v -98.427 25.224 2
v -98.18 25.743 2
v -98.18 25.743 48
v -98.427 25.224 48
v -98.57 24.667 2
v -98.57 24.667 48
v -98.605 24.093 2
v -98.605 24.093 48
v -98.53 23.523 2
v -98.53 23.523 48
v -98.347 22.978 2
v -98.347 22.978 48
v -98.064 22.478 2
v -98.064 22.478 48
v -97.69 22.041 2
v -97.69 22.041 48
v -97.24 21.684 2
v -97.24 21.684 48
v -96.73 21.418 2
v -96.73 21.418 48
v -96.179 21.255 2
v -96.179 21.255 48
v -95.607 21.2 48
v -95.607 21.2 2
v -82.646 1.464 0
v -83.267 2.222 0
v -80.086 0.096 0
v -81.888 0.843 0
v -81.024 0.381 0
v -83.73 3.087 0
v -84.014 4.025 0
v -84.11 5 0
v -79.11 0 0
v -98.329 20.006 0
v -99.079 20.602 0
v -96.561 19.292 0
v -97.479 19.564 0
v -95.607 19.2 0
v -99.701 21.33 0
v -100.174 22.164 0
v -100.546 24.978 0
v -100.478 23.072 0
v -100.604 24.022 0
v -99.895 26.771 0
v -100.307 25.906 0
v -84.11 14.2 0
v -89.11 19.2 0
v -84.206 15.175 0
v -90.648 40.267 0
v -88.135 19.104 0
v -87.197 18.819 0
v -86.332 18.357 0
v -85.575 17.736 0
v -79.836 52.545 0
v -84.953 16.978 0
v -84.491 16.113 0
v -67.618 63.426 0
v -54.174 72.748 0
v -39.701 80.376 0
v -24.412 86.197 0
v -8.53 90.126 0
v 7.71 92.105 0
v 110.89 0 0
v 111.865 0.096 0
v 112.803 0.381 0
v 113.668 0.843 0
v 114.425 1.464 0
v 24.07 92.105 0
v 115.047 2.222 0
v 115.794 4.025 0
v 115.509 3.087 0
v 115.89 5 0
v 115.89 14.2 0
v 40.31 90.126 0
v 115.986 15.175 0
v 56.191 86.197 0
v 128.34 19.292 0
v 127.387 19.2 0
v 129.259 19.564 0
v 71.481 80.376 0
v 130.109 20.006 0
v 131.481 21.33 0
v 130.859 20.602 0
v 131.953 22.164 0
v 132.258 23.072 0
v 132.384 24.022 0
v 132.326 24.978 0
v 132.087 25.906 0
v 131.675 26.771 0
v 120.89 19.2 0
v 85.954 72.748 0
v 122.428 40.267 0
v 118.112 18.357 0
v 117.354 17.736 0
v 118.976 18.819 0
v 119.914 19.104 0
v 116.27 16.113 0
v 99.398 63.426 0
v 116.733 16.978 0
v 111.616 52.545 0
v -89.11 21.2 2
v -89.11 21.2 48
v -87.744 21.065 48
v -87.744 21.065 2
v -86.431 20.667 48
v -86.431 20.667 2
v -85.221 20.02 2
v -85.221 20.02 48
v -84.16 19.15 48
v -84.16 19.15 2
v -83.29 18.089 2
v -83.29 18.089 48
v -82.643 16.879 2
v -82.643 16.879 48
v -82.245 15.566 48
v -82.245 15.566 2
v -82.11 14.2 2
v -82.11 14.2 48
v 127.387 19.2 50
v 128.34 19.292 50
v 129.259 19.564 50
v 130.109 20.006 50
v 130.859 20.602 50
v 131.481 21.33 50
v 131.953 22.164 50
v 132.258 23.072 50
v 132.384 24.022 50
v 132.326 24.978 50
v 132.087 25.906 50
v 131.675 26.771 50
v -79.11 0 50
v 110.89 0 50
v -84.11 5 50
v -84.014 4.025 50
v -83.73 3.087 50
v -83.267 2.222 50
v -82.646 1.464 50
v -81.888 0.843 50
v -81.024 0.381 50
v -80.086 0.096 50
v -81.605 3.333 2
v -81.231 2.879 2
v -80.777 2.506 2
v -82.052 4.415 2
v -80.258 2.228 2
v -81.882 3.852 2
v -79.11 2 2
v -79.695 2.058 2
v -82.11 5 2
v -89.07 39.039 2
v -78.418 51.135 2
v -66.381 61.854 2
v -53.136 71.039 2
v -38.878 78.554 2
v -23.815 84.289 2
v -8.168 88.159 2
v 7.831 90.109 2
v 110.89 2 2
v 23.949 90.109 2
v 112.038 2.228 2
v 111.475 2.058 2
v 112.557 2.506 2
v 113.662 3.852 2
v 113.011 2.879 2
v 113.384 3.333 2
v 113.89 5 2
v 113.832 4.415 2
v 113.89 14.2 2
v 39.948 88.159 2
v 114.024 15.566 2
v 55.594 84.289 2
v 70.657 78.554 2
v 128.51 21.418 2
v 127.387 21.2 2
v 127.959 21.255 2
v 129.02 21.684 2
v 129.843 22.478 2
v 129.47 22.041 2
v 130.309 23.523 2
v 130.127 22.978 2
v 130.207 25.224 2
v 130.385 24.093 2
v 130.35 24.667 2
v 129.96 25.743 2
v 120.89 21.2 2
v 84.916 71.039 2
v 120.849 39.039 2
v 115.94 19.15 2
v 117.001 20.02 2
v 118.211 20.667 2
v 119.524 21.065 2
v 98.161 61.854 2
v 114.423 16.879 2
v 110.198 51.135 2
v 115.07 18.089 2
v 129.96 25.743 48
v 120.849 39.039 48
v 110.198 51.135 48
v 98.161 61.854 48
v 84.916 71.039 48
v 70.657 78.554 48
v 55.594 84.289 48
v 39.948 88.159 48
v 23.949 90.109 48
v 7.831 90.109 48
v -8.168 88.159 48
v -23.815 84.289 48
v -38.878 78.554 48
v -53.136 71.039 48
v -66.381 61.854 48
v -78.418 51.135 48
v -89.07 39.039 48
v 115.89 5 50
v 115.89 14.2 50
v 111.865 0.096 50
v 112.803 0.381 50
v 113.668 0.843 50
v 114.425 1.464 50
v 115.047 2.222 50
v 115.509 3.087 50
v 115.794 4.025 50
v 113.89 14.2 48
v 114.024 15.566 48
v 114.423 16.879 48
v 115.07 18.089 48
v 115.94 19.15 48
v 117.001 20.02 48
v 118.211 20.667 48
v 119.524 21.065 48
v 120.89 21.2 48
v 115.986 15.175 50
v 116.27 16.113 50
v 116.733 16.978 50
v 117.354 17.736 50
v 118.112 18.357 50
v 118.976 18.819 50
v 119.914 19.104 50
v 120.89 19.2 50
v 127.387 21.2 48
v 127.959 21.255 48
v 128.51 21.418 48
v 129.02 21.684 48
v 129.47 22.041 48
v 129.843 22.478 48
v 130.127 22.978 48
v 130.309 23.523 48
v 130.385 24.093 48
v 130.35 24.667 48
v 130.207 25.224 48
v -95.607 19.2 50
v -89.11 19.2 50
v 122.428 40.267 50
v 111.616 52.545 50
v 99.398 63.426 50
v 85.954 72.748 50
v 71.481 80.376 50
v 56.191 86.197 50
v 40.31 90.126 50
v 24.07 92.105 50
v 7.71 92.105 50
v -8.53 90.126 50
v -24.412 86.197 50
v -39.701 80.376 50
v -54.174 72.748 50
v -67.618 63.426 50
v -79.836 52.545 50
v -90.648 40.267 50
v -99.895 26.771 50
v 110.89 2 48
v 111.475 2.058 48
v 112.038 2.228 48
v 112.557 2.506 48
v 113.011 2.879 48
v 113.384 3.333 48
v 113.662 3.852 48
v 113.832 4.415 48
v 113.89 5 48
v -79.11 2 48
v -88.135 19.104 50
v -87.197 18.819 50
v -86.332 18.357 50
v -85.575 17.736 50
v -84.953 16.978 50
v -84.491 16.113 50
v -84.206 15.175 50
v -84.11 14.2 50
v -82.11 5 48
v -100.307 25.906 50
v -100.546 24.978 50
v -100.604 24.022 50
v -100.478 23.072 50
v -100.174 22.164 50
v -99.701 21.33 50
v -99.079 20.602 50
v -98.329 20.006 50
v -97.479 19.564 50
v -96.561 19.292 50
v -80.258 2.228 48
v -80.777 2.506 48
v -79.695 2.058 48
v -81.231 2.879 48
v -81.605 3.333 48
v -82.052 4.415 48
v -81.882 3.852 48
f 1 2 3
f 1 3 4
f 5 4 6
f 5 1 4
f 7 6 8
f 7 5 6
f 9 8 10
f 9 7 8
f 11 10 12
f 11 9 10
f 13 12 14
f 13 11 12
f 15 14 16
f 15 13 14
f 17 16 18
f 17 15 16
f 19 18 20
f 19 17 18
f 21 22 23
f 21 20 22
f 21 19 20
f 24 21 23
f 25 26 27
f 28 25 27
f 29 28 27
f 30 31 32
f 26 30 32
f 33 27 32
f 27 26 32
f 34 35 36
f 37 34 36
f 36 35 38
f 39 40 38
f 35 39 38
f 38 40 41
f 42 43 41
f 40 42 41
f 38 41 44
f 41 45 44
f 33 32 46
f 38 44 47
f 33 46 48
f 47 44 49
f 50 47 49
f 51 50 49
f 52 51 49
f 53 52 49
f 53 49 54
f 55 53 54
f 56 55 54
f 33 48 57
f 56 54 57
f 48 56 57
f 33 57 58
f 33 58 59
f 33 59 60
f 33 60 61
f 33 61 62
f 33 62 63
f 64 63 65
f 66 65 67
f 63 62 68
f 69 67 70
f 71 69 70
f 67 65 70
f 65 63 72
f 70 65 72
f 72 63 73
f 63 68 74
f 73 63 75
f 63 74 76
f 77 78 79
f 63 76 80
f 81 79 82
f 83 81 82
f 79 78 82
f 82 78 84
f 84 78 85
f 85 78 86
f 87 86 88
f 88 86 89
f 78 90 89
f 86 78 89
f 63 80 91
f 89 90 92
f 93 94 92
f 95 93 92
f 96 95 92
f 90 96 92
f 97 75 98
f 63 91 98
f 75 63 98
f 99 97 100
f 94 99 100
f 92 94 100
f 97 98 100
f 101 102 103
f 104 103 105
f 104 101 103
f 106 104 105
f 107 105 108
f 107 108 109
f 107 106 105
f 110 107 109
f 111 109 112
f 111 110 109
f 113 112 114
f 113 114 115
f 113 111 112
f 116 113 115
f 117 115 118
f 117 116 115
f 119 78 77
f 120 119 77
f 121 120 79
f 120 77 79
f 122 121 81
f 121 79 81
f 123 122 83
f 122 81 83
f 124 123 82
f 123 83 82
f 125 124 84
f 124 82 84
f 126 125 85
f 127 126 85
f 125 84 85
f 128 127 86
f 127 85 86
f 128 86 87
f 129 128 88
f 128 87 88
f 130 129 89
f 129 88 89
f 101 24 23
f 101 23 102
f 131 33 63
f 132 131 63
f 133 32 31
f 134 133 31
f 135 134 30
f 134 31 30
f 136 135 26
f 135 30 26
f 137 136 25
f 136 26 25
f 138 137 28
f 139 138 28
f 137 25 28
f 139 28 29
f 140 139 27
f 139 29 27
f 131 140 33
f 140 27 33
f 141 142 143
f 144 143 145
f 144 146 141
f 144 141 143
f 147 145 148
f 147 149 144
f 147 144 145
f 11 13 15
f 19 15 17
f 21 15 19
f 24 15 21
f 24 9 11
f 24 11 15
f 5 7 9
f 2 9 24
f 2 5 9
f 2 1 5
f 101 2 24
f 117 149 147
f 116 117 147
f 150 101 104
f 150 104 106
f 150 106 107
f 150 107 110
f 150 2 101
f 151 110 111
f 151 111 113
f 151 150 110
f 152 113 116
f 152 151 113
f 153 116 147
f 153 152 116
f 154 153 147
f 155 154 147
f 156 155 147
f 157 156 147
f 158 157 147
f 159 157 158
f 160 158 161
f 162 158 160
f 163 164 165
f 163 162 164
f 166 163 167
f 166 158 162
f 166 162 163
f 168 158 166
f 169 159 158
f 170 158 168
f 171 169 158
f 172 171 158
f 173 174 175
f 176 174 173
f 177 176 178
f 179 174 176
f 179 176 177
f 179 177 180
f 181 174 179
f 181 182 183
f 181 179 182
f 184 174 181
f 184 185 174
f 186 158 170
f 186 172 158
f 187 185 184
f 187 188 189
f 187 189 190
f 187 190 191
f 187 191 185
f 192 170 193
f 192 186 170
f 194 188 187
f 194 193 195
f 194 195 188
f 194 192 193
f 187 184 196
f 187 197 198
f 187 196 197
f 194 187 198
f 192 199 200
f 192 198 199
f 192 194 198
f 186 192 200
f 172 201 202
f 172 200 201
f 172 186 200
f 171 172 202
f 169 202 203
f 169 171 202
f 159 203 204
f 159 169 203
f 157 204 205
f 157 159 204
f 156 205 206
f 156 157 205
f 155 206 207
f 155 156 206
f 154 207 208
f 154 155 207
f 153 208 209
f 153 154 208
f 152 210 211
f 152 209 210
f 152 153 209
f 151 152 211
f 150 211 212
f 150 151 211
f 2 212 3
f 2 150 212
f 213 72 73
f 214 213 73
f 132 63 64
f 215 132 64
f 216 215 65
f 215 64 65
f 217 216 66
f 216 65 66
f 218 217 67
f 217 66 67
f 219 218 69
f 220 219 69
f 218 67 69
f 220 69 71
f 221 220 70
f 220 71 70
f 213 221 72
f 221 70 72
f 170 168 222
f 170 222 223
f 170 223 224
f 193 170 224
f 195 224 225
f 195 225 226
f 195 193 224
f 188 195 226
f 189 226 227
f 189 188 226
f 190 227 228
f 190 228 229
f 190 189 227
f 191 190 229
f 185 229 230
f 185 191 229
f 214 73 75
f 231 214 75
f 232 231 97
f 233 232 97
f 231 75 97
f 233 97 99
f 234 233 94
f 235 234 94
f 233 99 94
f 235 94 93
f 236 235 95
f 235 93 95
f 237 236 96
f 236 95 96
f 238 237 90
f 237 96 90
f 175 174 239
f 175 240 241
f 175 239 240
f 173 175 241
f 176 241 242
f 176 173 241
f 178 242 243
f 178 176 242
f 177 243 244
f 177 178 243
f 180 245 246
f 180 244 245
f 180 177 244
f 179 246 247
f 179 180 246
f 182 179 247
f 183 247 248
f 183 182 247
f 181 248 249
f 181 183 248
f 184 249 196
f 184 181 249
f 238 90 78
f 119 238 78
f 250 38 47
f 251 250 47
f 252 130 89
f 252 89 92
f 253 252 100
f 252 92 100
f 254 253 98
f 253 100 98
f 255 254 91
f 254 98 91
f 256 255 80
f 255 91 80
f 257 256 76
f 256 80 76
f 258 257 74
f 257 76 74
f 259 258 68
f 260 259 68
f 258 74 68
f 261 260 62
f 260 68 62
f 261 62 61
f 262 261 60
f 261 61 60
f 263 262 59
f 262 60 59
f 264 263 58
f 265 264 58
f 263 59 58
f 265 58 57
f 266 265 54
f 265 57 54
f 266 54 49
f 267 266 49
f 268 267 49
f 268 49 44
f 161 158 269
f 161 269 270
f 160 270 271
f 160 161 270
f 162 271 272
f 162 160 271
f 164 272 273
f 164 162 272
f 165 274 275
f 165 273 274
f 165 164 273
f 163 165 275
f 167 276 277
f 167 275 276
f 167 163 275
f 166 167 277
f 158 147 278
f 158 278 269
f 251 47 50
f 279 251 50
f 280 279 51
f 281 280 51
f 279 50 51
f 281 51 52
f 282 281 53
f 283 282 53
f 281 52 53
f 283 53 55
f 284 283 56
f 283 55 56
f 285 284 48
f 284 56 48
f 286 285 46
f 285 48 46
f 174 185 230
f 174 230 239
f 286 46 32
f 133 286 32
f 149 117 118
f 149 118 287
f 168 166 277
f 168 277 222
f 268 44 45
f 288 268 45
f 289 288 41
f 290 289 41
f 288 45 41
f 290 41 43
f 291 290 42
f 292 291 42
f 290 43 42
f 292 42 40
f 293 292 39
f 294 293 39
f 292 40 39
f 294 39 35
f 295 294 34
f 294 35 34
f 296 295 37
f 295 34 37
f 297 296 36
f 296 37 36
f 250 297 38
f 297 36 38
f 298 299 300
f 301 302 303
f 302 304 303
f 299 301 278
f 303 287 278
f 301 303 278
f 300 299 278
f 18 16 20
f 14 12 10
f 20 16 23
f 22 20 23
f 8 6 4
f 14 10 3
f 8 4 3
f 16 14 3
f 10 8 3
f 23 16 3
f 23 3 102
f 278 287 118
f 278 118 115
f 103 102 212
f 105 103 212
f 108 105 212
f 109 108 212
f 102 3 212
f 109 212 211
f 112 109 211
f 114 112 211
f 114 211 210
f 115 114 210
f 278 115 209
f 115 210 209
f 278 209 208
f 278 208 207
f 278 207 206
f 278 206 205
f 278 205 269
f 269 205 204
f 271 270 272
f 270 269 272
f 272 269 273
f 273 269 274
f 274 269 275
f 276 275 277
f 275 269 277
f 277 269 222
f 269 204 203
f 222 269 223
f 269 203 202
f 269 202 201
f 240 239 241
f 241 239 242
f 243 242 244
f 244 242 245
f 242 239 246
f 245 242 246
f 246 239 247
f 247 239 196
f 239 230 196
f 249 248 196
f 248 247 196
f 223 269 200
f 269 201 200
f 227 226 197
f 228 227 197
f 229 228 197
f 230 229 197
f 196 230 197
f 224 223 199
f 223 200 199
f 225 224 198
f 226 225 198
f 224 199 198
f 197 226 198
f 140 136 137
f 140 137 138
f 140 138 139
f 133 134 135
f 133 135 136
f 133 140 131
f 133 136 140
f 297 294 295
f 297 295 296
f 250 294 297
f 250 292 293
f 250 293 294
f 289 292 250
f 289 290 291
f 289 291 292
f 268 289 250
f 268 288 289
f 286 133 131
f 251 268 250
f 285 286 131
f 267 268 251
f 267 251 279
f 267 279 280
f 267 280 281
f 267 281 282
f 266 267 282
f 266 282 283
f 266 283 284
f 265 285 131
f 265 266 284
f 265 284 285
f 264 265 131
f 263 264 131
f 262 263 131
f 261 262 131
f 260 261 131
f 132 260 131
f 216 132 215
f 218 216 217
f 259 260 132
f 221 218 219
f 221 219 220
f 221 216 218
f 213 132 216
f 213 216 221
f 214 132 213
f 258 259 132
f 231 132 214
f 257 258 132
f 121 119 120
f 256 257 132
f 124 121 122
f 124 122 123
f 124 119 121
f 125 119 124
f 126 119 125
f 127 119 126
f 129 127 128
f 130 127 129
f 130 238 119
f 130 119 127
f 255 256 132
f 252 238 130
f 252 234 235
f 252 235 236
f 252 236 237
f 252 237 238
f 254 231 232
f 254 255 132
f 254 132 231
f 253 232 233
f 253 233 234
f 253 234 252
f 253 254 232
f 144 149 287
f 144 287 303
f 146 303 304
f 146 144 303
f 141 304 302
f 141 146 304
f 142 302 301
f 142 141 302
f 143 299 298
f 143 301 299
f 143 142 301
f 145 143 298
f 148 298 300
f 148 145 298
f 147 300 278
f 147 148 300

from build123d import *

# Parameters (mm, degrees)
BOSS_EXTRU_1_DEPTH = 50
COQUE1_T           = 2


with BuildPart() as part:
    # Esquisse1 → Boss.-Extru.1 (new body)
    with BuildSketch(Plane.XY):
        with BuildLine():
            Line((-79.110112943, 0), (110.889887057, 0))
            ThreePointArc((110.889887057, 0), (114.425420963, 1.464466094), (115.889887057, 5))
            Line((115.889887057, 5), (115.889887057, 14.2))
            ThreePointArc((115.889887057, 14.2), (117.354353151, 17.735533906), (120.889887057, 19.2))
            Line((120.889887057, 19.2), (127.386676949, 19.2))
            ThreePointArc((127.386676949, 19.2), (131.737258082, 21.735767095), (131.675015022, 26.771022476))
            ThreePointArc((131.675015022, 26.771022476), (15.889887057, 92.353415616), (-99.895240907, 26.771022476))
            ThreePointArc((-99.895240907, 26.771022476), (-99.957483967, 21.735767095), (-95.606902834, 19.2))
            Line((-95.606902834, 19.2), (-89.110112943, 19.2))
            ThreePointArc((-89.110112943, 19.2), (-85.574579037, 17.735533906), (-84.110112943, 14.2))
            Line((-84.110112943, 14.2), (-84.110112943, 5))
            ThreePointArc((-84.110112943, 5), (-82.645646849, 1.464466094), (-79.110112943, 0))
        make_face()
    extrude(amount=BOSS_EXTRU_1_DEPTH)

    # Coque1 (no face opened: a closed hollow body)
    add(offset(amount=-COQUE1_T, mode=Mode.PRIVATE), mode=Mode.SUBTRACT)


solid = part.part
